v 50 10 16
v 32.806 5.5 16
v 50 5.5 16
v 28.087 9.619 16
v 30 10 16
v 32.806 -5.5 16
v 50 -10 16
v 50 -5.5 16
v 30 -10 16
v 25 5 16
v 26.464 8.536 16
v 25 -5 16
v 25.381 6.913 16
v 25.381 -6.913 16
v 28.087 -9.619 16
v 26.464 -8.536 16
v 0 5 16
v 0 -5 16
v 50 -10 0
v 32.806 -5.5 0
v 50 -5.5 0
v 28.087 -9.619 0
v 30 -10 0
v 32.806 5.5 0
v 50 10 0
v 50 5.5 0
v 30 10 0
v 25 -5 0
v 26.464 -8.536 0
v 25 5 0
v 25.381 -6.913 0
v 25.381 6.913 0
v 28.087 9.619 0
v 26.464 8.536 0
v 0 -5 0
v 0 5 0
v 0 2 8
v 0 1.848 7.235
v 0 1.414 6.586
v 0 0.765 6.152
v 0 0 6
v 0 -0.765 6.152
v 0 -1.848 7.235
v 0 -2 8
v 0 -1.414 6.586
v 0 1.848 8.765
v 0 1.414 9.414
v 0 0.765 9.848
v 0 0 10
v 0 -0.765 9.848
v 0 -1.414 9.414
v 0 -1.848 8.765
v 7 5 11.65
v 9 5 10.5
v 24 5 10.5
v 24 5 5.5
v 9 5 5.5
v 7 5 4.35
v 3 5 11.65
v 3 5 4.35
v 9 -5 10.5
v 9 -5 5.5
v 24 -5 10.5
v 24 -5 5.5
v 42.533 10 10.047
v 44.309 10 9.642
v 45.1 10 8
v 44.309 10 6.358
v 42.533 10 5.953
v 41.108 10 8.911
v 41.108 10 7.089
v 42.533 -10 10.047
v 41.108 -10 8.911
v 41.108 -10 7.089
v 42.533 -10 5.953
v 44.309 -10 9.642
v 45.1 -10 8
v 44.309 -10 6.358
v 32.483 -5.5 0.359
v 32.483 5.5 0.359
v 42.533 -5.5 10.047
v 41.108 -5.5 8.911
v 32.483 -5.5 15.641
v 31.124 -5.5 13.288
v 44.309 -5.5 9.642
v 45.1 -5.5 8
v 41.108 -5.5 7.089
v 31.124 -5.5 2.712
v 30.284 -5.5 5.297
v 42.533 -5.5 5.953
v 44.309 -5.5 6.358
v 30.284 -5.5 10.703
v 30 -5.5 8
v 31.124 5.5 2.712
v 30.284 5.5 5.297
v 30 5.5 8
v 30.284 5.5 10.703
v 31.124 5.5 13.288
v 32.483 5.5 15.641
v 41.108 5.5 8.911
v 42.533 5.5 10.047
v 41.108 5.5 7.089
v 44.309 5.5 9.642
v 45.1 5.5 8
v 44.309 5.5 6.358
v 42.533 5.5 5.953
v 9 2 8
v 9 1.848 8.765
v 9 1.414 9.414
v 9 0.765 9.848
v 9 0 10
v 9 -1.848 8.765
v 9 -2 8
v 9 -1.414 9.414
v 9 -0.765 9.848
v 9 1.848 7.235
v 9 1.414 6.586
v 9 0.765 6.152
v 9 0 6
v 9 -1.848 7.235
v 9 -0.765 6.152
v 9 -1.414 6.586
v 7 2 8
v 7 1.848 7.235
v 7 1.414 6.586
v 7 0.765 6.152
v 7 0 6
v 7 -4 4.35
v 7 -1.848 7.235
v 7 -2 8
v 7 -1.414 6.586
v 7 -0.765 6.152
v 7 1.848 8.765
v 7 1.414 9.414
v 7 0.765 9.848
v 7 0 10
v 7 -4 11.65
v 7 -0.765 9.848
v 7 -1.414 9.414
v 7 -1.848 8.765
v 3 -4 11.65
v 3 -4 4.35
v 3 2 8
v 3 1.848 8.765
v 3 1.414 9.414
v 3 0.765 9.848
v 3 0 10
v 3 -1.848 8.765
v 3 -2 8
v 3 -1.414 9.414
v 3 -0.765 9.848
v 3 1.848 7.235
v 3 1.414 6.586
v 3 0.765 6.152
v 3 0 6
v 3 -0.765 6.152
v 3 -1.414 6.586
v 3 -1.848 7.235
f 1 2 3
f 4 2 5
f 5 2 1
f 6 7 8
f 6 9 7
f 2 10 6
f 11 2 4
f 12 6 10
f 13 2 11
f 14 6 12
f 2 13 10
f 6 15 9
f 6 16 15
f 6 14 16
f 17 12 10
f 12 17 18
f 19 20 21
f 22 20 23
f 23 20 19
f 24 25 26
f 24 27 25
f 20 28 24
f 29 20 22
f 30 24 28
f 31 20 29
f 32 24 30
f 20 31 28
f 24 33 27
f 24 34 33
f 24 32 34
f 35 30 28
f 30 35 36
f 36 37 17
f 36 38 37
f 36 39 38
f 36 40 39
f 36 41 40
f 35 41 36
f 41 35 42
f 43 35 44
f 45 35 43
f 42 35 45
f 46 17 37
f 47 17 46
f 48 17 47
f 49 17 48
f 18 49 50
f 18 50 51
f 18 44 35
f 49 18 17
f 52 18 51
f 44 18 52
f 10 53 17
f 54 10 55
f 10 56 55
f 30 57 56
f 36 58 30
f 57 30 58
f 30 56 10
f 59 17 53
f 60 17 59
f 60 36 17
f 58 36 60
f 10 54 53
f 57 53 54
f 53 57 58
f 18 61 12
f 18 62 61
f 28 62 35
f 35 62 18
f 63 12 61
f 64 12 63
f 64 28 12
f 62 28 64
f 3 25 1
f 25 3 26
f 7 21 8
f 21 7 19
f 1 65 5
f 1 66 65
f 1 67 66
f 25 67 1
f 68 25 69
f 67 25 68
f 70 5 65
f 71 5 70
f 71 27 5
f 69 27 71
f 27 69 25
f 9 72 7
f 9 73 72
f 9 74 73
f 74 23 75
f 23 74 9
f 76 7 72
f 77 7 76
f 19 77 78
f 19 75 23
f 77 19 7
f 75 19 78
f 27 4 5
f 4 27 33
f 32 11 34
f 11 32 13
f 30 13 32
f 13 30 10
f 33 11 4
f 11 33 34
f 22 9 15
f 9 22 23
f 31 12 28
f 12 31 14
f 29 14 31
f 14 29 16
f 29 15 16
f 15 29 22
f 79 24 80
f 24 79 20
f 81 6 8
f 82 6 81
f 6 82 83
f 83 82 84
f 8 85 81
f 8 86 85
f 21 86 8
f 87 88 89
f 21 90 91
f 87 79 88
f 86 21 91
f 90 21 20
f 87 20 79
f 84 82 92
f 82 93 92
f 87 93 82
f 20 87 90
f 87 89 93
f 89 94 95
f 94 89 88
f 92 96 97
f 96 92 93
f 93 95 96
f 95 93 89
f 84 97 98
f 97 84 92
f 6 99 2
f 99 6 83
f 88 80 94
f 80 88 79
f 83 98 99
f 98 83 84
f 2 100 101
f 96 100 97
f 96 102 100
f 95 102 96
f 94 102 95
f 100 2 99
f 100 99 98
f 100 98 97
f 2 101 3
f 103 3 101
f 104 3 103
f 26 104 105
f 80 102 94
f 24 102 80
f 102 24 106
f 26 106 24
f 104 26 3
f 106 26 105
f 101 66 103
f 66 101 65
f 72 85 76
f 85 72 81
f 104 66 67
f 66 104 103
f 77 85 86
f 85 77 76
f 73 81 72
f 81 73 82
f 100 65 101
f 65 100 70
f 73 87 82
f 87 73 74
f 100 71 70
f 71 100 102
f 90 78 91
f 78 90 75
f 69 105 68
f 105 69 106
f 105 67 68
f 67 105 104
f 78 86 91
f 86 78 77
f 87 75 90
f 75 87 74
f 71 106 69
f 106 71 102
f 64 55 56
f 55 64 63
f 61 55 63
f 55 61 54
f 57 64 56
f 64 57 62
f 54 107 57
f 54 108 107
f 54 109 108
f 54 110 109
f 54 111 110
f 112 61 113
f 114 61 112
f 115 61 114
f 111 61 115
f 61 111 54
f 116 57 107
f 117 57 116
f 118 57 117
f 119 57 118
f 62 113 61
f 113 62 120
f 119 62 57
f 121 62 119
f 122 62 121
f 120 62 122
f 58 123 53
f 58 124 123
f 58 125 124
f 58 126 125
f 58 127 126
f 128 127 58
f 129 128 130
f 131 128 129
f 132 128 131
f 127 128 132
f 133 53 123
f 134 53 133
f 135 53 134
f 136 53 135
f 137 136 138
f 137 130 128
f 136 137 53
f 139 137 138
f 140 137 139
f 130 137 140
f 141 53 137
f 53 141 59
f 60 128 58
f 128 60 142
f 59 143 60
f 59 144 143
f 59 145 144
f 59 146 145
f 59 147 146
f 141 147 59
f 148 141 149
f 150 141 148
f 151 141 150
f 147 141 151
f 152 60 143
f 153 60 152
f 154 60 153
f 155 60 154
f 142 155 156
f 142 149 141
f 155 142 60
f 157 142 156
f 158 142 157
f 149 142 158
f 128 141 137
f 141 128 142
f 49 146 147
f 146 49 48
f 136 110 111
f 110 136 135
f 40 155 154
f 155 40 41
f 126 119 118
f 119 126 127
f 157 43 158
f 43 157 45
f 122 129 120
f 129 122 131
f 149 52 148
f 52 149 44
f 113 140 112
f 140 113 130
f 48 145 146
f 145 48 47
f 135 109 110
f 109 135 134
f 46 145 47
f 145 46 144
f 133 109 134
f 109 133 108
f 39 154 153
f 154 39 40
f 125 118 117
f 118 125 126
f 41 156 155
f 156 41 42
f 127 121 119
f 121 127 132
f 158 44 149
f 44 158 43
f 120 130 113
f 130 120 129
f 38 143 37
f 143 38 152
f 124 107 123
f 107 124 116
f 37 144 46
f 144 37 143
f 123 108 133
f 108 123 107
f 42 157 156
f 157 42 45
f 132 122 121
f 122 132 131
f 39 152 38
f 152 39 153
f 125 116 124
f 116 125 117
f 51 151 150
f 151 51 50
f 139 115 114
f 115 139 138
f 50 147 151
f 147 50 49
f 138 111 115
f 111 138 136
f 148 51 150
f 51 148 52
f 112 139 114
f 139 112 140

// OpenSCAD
bearing_624_double = [13, 10, 4, 0];
// this one has roughly same diameter as pulley, makes belt parallel so its prettier
bearing_623_double = [10, 8, 3, 0];

idler_bearing              = bearing_624_double;
m4_diameter                = 4.7;
m4_nut_diameter            = 7.6;
m4_nut_diameter_horizontal = 8.15;

width_over_thickness = 2.2;
layer_height = 0.25;
single_wall_width = width_over_thickness * layer_height;
idler_width = (idler_bearing[1] > 7 ? idler_bearing[1] : 7) + 2.5 * idler_bearing[3] ;
use_fillets = 1;

tensioner();

module tensioner()
{
   difference() {
     union() {
            translate([0,-5,0]) cube([30,10,16]);
            translate([30,-10,0]) cube([20,20,16]);
            translate([30,5,0]) cylinder(r=5,h=16,$fn=16);
            translate([30,-5,0]) cylinder(r=5,h=16,$fn=16);
     }

     #translate([43,11/2,8]) rotate([90,0,0]) {
        cylinder(r=13,h=11);
        translate([0,0,-6]) cylinder(r=2.1,h=25);
      }

     #translate([9,-7,-5/2+8]) cube([15,16,5]);
     #translate([3,-4,-7.3/2+8]) cube([4,16,7.3]);
     #translate([-1,0,16/2]) rotate([0,90,0]) cylinder(r=2,h=20,$fn=16);
   }
}
